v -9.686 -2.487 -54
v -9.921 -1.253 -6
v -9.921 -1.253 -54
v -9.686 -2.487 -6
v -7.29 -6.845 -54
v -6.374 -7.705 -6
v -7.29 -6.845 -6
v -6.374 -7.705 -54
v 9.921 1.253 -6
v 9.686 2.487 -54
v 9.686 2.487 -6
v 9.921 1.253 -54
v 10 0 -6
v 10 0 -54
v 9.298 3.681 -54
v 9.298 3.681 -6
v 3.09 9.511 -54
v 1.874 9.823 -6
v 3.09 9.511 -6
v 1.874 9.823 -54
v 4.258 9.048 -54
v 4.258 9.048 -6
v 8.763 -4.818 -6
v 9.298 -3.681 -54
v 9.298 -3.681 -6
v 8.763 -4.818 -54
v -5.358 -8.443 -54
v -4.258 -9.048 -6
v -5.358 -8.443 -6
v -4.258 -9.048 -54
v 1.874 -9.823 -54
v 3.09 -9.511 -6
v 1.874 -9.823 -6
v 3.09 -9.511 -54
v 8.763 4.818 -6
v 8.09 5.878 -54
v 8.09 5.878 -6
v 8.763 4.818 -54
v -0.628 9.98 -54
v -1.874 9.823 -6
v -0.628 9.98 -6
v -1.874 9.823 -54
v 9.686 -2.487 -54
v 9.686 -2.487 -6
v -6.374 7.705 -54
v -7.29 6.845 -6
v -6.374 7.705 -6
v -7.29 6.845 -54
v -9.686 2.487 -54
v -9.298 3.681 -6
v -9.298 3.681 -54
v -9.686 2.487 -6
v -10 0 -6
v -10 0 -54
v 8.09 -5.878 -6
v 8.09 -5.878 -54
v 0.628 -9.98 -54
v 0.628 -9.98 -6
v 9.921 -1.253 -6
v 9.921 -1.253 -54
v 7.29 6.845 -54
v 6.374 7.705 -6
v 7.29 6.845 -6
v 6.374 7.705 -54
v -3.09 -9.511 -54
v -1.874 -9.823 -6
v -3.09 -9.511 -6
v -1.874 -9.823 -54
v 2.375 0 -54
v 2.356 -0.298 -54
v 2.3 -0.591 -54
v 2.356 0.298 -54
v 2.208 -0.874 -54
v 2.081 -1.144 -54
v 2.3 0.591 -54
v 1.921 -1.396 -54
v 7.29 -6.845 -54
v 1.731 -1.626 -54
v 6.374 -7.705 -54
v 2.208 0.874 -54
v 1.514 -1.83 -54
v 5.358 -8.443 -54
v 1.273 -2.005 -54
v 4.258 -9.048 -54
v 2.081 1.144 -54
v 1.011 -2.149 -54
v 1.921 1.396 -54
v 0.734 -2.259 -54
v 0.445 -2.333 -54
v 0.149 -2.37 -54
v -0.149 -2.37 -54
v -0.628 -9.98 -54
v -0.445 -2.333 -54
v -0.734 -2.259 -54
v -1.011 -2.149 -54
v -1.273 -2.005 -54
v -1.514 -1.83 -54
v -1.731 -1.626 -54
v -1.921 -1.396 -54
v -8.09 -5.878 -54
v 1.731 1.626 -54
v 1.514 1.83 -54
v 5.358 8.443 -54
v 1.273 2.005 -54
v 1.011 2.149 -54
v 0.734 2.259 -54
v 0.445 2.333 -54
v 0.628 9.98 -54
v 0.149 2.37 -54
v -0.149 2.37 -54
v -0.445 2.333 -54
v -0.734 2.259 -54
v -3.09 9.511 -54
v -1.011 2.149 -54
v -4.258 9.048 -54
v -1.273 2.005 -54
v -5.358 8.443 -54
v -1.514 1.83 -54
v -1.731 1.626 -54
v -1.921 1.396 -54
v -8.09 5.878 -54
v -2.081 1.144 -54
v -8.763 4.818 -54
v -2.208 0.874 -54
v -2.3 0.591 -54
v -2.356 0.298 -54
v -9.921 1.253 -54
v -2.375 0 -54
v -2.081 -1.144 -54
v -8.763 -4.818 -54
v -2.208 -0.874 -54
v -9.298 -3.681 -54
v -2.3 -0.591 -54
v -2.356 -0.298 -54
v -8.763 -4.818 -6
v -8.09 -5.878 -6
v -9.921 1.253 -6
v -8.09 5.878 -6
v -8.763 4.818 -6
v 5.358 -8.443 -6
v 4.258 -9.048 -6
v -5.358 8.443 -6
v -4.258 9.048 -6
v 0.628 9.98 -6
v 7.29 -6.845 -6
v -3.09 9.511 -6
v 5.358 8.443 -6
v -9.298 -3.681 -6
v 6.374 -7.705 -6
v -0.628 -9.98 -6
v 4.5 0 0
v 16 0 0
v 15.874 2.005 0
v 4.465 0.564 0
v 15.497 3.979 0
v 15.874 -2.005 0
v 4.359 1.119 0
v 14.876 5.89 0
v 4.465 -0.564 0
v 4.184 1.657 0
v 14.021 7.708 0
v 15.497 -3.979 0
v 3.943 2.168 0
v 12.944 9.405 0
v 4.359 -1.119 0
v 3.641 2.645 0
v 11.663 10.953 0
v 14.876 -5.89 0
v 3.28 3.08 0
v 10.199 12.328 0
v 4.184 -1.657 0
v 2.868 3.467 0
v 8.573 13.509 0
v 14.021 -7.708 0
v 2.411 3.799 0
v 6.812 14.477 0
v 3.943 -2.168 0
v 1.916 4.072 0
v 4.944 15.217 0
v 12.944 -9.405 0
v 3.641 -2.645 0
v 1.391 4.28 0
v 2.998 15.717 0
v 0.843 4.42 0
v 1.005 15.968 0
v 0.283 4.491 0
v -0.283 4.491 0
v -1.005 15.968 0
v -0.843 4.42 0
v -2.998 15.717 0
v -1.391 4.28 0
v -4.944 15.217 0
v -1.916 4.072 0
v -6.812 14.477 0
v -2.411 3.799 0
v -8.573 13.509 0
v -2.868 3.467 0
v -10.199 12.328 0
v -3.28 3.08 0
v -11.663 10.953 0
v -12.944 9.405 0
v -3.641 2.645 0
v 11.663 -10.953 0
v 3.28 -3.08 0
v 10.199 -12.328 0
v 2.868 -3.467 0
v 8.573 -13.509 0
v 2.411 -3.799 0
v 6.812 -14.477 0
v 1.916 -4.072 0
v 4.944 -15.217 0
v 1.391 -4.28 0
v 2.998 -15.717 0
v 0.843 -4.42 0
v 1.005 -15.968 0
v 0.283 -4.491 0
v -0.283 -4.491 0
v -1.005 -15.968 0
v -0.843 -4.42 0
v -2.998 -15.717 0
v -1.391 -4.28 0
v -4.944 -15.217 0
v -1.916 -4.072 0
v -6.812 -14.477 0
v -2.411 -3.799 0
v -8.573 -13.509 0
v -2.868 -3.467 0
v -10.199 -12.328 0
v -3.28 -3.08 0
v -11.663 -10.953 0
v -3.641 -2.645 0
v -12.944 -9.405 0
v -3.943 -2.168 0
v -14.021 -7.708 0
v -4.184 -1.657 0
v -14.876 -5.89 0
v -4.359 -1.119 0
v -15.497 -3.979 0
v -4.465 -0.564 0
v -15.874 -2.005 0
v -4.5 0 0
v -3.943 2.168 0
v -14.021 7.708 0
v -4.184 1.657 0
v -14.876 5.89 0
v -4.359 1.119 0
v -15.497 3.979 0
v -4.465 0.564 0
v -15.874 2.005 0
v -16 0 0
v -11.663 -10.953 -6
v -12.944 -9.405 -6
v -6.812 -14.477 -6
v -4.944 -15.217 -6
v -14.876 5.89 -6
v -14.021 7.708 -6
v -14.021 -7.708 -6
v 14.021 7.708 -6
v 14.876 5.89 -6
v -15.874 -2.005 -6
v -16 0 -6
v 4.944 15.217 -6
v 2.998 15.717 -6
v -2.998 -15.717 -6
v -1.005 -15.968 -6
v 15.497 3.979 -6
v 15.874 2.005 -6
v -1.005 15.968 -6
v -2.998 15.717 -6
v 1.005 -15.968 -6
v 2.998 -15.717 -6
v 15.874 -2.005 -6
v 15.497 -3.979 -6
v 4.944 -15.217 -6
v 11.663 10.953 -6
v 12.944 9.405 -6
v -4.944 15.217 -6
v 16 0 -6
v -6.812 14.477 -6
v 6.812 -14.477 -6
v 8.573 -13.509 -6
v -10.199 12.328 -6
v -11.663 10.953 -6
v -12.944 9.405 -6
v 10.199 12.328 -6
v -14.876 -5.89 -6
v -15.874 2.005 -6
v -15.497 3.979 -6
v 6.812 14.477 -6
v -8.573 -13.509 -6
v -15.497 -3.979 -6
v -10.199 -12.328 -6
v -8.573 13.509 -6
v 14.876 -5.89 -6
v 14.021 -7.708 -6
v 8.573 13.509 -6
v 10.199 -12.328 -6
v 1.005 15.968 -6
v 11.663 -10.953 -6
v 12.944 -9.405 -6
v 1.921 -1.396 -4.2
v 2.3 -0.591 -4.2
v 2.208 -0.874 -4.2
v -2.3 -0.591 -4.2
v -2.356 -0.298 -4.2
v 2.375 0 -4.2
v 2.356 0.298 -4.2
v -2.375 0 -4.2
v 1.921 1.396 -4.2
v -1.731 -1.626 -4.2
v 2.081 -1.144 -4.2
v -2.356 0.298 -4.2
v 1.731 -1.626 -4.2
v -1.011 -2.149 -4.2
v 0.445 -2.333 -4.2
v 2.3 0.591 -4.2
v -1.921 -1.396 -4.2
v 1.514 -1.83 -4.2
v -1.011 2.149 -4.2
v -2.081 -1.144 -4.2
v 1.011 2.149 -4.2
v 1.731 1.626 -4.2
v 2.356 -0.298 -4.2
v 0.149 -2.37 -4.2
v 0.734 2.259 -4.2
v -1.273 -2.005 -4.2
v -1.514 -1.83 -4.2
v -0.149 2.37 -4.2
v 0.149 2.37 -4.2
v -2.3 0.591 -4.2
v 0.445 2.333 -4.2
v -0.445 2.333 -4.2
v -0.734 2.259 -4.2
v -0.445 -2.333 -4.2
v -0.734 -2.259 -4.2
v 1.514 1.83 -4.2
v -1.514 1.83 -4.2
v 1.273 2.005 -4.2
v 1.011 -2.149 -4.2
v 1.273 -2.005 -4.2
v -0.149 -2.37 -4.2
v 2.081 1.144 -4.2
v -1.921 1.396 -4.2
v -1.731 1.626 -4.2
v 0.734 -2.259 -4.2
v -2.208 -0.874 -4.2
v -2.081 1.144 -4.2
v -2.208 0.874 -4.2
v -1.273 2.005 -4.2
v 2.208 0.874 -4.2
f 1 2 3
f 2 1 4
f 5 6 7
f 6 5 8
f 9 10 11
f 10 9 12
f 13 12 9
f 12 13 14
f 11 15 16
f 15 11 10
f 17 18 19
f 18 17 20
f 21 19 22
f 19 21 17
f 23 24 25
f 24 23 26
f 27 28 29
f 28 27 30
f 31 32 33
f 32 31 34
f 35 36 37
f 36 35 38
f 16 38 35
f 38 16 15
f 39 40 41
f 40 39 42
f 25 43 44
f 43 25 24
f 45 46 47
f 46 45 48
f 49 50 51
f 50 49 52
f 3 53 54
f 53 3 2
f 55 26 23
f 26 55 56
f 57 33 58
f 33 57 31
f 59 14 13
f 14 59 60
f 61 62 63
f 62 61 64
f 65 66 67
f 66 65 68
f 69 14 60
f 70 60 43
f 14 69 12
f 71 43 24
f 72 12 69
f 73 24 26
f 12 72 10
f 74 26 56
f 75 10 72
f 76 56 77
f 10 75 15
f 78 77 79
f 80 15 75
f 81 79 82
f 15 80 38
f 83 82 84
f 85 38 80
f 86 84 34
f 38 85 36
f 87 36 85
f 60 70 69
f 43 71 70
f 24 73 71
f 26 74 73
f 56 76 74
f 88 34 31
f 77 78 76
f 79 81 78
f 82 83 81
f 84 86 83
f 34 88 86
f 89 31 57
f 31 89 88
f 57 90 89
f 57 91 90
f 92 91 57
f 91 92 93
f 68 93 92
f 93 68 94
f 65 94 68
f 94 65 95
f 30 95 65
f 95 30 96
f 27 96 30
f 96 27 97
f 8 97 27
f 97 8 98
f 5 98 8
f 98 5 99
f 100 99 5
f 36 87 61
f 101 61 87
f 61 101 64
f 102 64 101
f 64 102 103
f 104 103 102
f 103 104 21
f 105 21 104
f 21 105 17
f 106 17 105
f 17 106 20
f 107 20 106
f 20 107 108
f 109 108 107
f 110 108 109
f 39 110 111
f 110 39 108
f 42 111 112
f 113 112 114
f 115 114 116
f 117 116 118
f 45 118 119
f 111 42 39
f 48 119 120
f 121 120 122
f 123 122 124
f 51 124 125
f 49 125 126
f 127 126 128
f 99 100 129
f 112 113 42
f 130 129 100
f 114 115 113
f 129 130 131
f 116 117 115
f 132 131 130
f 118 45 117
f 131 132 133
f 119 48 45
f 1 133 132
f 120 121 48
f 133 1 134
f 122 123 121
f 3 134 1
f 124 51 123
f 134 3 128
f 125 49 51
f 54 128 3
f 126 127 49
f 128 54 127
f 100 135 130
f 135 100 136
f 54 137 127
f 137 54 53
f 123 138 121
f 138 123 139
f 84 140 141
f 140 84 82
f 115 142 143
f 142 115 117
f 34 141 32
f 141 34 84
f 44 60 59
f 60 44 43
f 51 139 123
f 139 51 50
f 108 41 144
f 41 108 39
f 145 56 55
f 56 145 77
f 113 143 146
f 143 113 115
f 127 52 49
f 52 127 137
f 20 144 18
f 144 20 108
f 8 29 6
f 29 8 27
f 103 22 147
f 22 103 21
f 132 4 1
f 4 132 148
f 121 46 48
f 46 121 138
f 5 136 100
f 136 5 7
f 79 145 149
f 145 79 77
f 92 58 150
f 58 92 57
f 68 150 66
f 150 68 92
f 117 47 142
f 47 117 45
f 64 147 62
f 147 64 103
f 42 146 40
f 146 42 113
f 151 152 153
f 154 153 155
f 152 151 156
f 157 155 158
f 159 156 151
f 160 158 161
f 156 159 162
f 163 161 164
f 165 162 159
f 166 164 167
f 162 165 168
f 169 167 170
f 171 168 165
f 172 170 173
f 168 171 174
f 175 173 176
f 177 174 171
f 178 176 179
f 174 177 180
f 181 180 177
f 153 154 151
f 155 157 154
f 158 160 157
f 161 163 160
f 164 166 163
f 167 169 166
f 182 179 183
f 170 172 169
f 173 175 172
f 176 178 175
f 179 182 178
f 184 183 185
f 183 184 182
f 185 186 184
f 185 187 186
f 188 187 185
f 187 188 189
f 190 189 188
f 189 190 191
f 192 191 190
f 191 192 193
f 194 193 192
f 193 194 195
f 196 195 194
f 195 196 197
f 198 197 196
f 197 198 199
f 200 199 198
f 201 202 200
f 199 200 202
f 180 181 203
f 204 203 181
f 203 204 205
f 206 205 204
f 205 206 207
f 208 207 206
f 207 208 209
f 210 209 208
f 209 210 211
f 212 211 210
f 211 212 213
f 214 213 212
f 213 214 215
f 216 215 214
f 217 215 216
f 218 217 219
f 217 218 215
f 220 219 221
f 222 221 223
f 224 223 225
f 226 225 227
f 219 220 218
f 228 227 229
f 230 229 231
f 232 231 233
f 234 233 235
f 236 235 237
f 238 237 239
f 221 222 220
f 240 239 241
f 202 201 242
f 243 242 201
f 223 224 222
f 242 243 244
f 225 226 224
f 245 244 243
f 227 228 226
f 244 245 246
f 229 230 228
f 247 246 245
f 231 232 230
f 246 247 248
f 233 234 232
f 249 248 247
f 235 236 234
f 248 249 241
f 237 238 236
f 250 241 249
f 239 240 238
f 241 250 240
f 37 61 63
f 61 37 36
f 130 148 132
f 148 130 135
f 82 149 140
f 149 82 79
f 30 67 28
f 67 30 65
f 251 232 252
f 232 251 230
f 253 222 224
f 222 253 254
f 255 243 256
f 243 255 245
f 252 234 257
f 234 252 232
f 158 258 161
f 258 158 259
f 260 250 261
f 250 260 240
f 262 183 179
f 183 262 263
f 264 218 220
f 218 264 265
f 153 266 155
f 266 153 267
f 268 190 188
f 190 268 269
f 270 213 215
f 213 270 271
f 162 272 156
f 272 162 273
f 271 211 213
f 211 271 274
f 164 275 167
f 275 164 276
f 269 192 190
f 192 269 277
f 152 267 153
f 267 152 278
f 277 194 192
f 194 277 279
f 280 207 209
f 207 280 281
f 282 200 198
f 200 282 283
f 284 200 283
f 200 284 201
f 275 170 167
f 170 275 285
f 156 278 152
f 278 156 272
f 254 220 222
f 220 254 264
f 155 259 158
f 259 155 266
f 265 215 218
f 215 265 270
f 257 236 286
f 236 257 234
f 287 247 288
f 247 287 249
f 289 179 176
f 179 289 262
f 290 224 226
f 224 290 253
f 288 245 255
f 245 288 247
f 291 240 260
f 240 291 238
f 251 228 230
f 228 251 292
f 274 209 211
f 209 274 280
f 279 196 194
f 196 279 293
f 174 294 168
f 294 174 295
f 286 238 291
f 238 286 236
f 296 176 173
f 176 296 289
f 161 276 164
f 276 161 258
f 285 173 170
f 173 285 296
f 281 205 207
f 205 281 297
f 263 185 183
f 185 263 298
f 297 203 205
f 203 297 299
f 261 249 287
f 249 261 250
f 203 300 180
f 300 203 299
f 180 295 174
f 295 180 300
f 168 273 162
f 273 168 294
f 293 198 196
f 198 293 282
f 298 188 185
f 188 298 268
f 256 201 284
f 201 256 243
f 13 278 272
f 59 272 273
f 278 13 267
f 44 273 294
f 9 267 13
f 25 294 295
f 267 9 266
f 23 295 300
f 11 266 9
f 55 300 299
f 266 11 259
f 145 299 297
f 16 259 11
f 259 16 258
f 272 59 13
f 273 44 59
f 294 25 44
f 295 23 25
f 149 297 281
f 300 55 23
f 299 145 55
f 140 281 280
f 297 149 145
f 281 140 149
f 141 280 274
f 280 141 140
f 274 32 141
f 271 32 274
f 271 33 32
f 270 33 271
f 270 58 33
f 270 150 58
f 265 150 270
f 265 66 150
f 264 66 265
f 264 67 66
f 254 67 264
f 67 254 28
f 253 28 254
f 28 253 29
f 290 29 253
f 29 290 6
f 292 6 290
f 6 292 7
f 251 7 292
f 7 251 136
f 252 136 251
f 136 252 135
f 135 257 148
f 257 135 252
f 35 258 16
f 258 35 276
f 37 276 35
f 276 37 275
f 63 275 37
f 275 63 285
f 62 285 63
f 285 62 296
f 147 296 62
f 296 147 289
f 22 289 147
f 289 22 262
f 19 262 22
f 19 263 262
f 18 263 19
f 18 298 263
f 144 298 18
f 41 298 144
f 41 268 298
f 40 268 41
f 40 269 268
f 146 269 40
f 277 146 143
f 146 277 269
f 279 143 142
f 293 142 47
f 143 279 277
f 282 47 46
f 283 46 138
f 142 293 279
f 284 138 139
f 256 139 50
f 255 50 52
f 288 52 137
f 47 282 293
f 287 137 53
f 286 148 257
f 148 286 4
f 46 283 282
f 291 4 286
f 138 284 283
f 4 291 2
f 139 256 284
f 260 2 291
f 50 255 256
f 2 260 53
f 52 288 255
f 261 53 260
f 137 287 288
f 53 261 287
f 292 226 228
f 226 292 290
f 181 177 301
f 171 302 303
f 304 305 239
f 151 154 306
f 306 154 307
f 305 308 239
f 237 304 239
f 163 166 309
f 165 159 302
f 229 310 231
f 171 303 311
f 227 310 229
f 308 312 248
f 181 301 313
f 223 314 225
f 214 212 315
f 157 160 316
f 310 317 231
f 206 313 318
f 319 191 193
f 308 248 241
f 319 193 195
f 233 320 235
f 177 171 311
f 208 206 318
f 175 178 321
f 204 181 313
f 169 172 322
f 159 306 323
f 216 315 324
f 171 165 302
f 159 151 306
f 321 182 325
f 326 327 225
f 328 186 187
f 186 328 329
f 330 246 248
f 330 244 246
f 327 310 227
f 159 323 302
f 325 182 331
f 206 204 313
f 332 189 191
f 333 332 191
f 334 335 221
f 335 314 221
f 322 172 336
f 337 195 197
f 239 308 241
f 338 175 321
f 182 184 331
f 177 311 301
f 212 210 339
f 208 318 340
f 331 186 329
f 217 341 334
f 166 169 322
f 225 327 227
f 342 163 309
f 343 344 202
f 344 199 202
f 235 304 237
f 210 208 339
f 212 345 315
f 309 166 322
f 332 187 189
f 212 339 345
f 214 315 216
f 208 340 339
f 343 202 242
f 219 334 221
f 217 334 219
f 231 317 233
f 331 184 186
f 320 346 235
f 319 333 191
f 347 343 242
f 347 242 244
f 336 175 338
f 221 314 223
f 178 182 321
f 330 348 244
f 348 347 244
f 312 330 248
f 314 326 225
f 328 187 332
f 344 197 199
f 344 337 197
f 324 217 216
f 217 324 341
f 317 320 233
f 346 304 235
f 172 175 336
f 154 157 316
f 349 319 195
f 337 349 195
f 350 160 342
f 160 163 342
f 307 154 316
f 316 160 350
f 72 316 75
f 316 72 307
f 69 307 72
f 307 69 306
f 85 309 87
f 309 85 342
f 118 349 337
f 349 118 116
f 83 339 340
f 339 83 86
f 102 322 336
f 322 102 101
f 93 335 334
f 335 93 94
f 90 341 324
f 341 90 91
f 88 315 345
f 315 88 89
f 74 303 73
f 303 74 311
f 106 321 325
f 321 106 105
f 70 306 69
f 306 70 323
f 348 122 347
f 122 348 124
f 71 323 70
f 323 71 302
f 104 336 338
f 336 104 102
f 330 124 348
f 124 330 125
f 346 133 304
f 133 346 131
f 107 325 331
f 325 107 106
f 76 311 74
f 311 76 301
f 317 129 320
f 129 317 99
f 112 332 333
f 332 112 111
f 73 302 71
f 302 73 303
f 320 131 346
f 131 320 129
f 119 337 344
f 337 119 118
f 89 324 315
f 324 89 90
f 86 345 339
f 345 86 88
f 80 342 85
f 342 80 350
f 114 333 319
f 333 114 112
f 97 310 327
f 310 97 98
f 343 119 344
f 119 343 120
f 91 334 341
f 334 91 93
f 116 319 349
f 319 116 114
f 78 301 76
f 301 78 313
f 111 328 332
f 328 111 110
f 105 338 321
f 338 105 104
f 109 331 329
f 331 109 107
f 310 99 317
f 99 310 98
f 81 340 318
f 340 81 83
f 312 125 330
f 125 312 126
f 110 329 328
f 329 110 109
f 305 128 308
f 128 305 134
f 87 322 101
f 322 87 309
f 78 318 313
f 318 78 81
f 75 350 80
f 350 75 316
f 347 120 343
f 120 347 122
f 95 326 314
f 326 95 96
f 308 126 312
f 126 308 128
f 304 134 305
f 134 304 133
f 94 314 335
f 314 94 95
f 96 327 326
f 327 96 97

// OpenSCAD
$fn = 50;


difference() {
	union() {
		translate(v = [0, 0, -54.0000000000]) {
			cylinder(h = 54, r = 10.0000000000);
		}
		translate(v = [0, 0, -6.0000000000]) {
			cylinder(h = 6, r = 16.0000000000);
		}
	}
	union() {
		translate(v = [0, 0, 0]) {
			rotate(a = [0, 0, 0]) {
				difference() {
					union() {
						#translate(v = [0, 0, -54.0000000000]) {
							cylinder(h = 54, r = 2.2500000000);
						}
						#translate(v = [0, 0, -4.2000000000]) {
							cylinder(h = 4.2000000000, r1 = 2.3750000000, r2 = 4.5000000000);
						}
						#translate(v = [0, 0, -54.0000000000]) {
							cylinder(h = 54, r = 2.3750000000);
						}
						#translate(v = [0, 0, -54.0000000000]) {
							cylinder(h = 54, r = 2.2500000000);
						}
					}
					union();
				}
			}
		}
	}
}
